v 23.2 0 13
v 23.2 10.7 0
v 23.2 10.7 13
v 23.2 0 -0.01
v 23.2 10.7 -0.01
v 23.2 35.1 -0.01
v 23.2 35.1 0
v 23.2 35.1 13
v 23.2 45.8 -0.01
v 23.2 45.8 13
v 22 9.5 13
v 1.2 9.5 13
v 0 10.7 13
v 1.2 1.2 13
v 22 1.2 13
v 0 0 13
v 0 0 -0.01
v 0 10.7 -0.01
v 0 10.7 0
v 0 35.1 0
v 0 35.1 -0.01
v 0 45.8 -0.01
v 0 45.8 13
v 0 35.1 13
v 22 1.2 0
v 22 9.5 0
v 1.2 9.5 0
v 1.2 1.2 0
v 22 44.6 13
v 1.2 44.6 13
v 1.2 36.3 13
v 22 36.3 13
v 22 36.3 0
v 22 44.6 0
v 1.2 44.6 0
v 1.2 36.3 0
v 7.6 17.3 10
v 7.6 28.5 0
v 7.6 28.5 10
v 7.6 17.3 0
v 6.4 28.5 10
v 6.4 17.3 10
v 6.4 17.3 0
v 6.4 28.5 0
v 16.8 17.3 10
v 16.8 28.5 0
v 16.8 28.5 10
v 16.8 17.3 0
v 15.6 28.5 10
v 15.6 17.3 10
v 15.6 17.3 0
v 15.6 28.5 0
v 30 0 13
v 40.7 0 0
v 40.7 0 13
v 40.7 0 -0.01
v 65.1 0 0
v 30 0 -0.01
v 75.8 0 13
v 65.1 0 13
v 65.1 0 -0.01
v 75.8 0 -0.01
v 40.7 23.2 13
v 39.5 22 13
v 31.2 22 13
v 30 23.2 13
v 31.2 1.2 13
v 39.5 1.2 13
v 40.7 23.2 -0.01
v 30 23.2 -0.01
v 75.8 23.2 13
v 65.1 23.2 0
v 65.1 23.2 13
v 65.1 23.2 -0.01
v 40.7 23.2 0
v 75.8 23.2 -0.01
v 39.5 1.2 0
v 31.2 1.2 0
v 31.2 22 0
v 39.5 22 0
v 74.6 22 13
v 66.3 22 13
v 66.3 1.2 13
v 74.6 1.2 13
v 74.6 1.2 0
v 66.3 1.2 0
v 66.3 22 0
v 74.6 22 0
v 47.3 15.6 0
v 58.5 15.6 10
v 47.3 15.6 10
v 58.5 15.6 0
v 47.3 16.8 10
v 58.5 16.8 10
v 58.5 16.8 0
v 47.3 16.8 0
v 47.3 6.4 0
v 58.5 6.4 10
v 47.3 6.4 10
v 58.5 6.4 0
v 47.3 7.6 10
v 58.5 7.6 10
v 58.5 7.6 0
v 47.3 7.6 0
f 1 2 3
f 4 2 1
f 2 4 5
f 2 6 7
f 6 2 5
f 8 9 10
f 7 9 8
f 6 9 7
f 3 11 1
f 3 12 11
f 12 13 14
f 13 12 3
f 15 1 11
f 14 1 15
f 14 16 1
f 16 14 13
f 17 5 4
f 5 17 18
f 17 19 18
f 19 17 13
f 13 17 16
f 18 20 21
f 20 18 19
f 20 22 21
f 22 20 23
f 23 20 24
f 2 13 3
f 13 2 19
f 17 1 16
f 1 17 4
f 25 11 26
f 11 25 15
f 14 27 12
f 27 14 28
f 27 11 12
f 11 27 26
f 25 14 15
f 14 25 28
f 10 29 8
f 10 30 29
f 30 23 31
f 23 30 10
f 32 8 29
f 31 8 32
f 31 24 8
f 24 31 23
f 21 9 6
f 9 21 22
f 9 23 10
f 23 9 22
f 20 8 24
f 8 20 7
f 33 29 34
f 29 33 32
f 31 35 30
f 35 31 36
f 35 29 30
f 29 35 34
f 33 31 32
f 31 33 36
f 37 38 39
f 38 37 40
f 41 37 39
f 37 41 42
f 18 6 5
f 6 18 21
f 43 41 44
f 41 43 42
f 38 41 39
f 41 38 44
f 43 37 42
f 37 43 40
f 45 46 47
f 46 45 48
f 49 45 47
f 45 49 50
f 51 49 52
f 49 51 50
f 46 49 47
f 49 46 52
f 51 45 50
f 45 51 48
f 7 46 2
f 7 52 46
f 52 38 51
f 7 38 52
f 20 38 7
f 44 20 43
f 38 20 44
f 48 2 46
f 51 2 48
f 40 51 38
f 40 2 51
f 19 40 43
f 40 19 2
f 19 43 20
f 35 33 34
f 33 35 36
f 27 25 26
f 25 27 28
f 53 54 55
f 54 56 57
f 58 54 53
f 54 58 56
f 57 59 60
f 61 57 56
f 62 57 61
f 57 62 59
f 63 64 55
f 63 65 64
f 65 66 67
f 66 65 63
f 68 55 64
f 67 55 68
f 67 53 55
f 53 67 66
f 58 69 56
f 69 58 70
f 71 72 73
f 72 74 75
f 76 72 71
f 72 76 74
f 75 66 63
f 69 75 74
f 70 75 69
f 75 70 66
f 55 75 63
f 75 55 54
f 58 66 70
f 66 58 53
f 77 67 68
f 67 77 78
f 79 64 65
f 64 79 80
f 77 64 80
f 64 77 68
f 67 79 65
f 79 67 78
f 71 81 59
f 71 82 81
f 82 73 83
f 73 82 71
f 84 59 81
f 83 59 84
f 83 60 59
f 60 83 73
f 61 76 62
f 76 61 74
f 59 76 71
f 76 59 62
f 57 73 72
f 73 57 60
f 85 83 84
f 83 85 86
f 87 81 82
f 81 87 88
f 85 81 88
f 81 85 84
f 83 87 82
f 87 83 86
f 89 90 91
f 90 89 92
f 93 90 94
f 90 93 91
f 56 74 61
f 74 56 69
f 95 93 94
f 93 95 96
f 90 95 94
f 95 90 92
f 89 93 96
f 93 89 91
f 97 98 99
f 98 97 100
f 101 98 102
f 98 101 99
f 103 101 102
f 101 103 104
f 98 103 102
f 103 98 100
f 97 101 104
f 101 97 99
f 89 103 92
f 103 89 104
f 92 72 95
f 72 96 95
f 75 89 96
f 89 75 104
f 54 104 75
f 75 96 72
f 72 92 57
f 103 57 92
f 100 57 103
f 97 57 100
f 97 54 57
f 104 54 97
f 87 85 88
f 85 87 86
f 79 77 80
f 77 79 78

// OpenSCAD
// file: ../../Elements/FrameLockingRing.scad
// Fischertechnik Box Library
// Frame for Locking Ring
// 31020

use <../Base/Constants.scad>
use <../ModelBase/Simple.scad>

width = 20;
depth = 7.5;
height = 13;

// getFrameLockingRingSpace(columns=1, rows=1)
// columns = Count of locking rings in X direction (width of ring)
// rows = Count of locking rings in Y direction (depth of ring)
// Gets the space the frame locking ring needs as width (.x and .y as a list)

function getFrameLockingRingSpace(columns=1, rows=1) = getFrameOuterVolume([width*columns, depth*rows, height]);

// FrameLockingRing(columns, rows, smallSideIsX)
// columns = Count of locking rings in X direction (width of ring)
// rows = Count of locking rings in Y direction (depth of ring)
// The walls of the frame are 13 mm high. The small side is 7.5 mm wide, the large side
// is 20 mm wide.

module FrameLockingRing(columns=1, rows=1) {
    Frame([width*columns, depth*rows, height]);
}

// Tests
color("lightgray")
    FrameLockingRing(1);
// file: ../../Elements/HolderWinchDrum.scad
// Fischertechnik Box Library
// Holder for Winch Drum
// 31016

use <../Base/Constants.scad>
use <../Base/Placement.scad>
use <../ModelBase/Simple.scad>

width = 20;
depth = 25;
height = 10;

// getWinchDrumHolderSpace()
// Gets the space the winch drum holder needs as width and depth (.x and .y as a list)

function getHolderWinchDrumSpace() = [width, depth, height];

// HolderWinchDrum()
// Two walls for holding the 31016 winch drum.

module HolderWinchDrum() {
    holderDepth = 11.2;
    holderDistance = 8;
    
    Space(getHolderWinchDrumSpace());
    
    module Holders() {
        Wall([getDividerThickness(), holderDepth, height]);
        translate([holderDistance + getDividerThickness(), 0])
            Wall([getDividerThickness(), holderDepth, height]);
    }
    
    Center(getHolderWinchDrumSpace(), [holderDistance + 2*getDividerThickness(), holderDepth]) {
        Holders();
    }
}

// Tests
color("lightgray")
HolderWinchDrum();
// file: ../../Base/Boxes.scad
// Fischertechnik Box Foundation
// Pre-designed Boxes

use <Constants.scad>

include <PlacementOptions.scad>

box190Width = 190;
box190Depth = 130;
box130Width = 130;
box130Depth = 95;
boxUsageHeight = 33.9;
boxWallThickness = 2.4;
boxBaseThickness = 1.0;

// getBoxWallThickness()
// Gets the wall thickness of a Fischertechnik Box

function getBoxWallThickness() = boxWallThickness;

// Gets the usable height of a fischertechnik box
function getBoxUsageHeight() = boxUsageHeight;

// Gets the thickness of the Fischertechnik box base.
function getBoxBaseThickness() = boxBaseThickness;

// Gets the usable inner space of a Box 190 as an x/y-list
function getBox190Space() = [
    box190Width - 2*getBoxWallThickness(), 
    box190Depth - 2*getBoxWallThickness() ];

// Imports the Fischertechnik empty box 130x190 mm and places it at position 0,0
// 190x130 are the outer sizes, the inner space is slightly smaller. Use getBox190Space() to get the inner sizes.
// This module needs the STL file "Fischertechnik Box 130x190.stl" in the library path.
// The box is positioned that the usable inner space is at the 0,0,0 position. The

module Box190() {
    translate([-getBoxWallThickness(),-getBoxWallThickness(),-getBoxBaseThickness()])
        import("Fischertechnik Box 130x190.stl", convexity=3);
}

// Gets the usable inner space of a Box 130 as an x/y-list
function getBox130Space() = [
    box130Width - 2*getBoxWallThickness(), 
    box130Depth - 2*getBoxWallThickness() ];

// Imports the Fischertechnik empty box 95x130 mm and places it at position 0,0
// 190x130 are the outer sizes, the inner space is slightly smaller. Use getBox190Space() to get the inner sizes.
// This module needs the STL file "Fischertechnik Box 95x130.stl" in the library path.
// The box is positioned that the usable inner space is at the 0,0,0 position. The

module Box130() {
    translate([-getBoxWallThickness(),-getBoxWallThickness(),-getBoxBaseThickness()])
        import("Fischertechnik Box 95x130.stl", convexity=3);
}

// Creates a web at the specified box walls
// corner 0 = LowerLeft, 1 = UpperLeft, 2 = UpperRight, 3 = LowerRight
// side 0 = LeftOfCorner, 1 = RightOfCorner
// distance = Distance in mm from the corner
// box = inner width and depth of the box (default: Box 190)
// webWidth = length of the web (default is 3 mms)
// webThickness = thickness of the web (default is 1 mm)

module BoxWeb(corner, side, distance, box=getBox190Space(), webWidth=3, webThickness=1.0) {
    sink = getBoxWallThickness()/2;

    width = (corner % 2 == 0) ? 
            (side == LeftOfCorner ? webWidth : webThickness) :
            (side == LeftOfCorner ? webThickness : webWidth);

    depth = (corner % 2 == 0) ? 
            (side == RightOfCorner ? webWidth : webThickness) :
            (side == RightOfCorner ? webThickness : webWidth);
    
    xDiff = corner == LowerLeft ? 
                (side == LeftOfCorner ? -sink : distance) :
            (corner == UpperLeft ?                
                (side == LeftOfCorner ? distance : -sink) :
            (corner == UpperRight ?
                (side == LeftOfCorner ? box.x-webWidth+sink : box.x-distance-webThickness) :
                (side == LeftOfCorner ? box.x-distance-webThickness: box.x-webWidth+sink)));

    yDiff = corner == LowerLeft ? 
                (side == RightOfCorner ? -sink : distance) :
            (corner == UpperLeft ?
                (side == RightOfCorner ? box.y-distance : box.y-webWidth+sink) :
            (corner == UpperRight ?
                (side == RightOfCorner ? box.y-webWidth+sink : box.y-distance) :
                (side == RightOfCorner ? distance : -sink)));
    
    translate([xDiff, yDiff, -getExcess()])
        cube([width, depth, boxUsageHeight + 2*getExcess()]);
}
// file: ../../Base/Rotation.scad
// Fischertechnik Box Foundation
// Geometry Helpers Rotation

include <PlacementOptions.scad>

// getRotatedSpace(space, rotation=NoRotation)
// Rotates the space dependent on the specified rotation

function getRotatedSpace(space, rotation=NoRotation) = [
    (rotation == Rotate90 || rotation == Rotate270) ? space.y : space.x,
    (rotation == Rotate90 || rotation == Rotate270) ? space.x : space.y
];

// Rotates the given space around the fixed left lower corner
// space = the space the children needs as width/depth list [width,depth]
// rotation = 0 Rotate0 degrees, 1 Rotate90 degrees, 2 Rotate180 degrees, 3 Rotate270 degrees (equivalent to -90)

module RotateFix(space, rotation=Rotate0) {
    dy = (rotation == Rotate0 || rotation == Rotate270) ? 0 :
        (rotation == Rotate90) ? space.x :
        space.y;
    dx = (rotation < Rotate180) ? 0 :
        (rotation == Rotate180) ? space.x :
        space.y;
    
    translate([dx, dy, 0])
        rotate([0, 0, rotations[rotation]])
            children();
}
// file: ../../Base/Alignment.scad
// Fischertechnik Box Foundation
// Geometry Helpers Alignment

include <PlacementOptions.scad>

// getAlignedX(elementWidth, spaceWidth, align=AlignRight, offset=0)
// Gets the aligned X offset of an element with the given
// width in the given space.
// elementWidth = The width of the element to positon
// spaceWidth = The space where the element should be aligned
// align = 0 AlignLeft, 1 AlignCenter, 2 AlignRight
// offset = an optional offset from the aligned position. When
// aligned left or centered, then positive values are in X direction.
// When aligned right then positive values are in negative X direction.

function getAlignedX(elementWidth, spaceWidth, align=AlignRight, offset=0) =
    (align == AlignLeft) ?
        offset :
        ((align == AlignCenter) ?
        (spaceWidth - elementWidth)/2 + offset :
        spaceWidth - offset - elementWidth);

// getAlignedY(elementDepth, spaceDepth, align=AlignTop, offset=0)
// Gets the aligned Y offset of an element with the given
// depth in the given space.
// elementDepth = The depth of the element to positon
// spaceDepth = The space where the element should be aligned
// align = 0 AlignBottom, 1 AlignCenter, 2 AlignTop
// offset = an optional offset from the aligned position. When
// aligned bottom or centered, then positive values are in Y direction.
// When aligned top then positive values are in negative Y direction.

function getAlignedY(elementDepth, spaceDepth, align=AlignTop, offset=0) =
    (align == AlignBottom) ?
        offset :
        ((align == AlignCenter) ?
        (spaceDepth - elementDepth)/2 + offset :
        spaceDepth - offset - elementDepth);
// file: ../../Base/Constants.scad
// Fischertechnik Box Foundation
// Constants

// Constant values necessary for multiple elements

// Base constants
dividerThickness = 1.2;
excess = 0.01;
fragments = 90;
tolerance = 0.8;

// Gets the thickness of a divider 
function getDividerThickness() = dividerThickness;

// Gets the excess that is used to merge walls into each other
function getExcess() = excess;

// Gets amount of fragments of a cylinder
function getFragments() = fragments;

// Gets the inner tolerance of a frame to each side
function getTolerance() = tolerance;


// Fischertechnik specific constants
axisDiameter = 4;
axisBottomDiameter = axisDiameter + 1;
standardEdgeDistance = 2.5;
standardWebDistance = 11.5;
standardCornerLength = 15;
tubeWallFactor = 1.6;

// Gets axis diameter
function getAxisDiameter() = axisDiameter;

// Gets axis bottom diameter for thicker part at the bottom
function getAxisBottomDiameter() = axisBottomDiameter;

// gets the standard distance to the wall of the box for dockable frames with webs
function getStandardEdgeDistance() = standardEdgeDistance;

// gets the standard distance of each web to the corner of the dockable frame
function getStandardWebDistance() = standardWebDistance;

// gets the standard length of the corner walls of a dockable frame
function getStandardCornerLength() = standardCornerLength;

// gets the wall thickness of a tube.
function getTubeWallThickness() = tubeWallFactor * getDividerThickness();
// file: ../../Base/PlacementOptions.scad
// Fischertechnik Box Foundation
// Placement Options

// Alignment
NoAlign = 0;
AlignLeft = 1;
AlignBottom = 2;
AlignCenter = 3;
AlignRight = 4;
AlignTop = 5;

// Element rotation degree steps
rotations = [0, -90, -180, -270];

// Rotation
NoRotation = 0;
Rotate0 = 0;
Rotate90 = 1;
Rotate180 = 2;
Rotate270 = 3;

// Docking (seen from above)
NoDock = -1;
DockLeft = 0;
DockTop = 1;
DockRight = 2;
DockCorner = 2;
DockBottom = 3;

// Web corners
LowerLeft = 0;
UpperLeft = 1;
UpperRight = 2;
LowerRight = 3;

// Web position relative to corner
LeftOfCorner = 0;
RightOfCorner = 1;
// file: ../../Elements/HolderWinchDrumWithLockingRings.scad
// Fischertechnik Box Library
// Complete Winch Drum with Locking Rings
// 31018 + 2 x 31020

use <../ModelBase/Simple.scad>
use <HolderWinchDrum.scad>
use <FrameLockingRing.scad>

distance = 24.4;

// getHolderWinchDrumWithLockingRingsSpace()
// Gets the space the holder winch drum with locking rings needs as width (.x and .y as a list)

function getHolderWinchDrumWithLockingRingsSpace() = [
    getFrameLockingRingSpace().x, 
    getFrameLockingRingSpace().y * 2 + distance,
    getFrameLockingRingSpace().z];

// HolderWinchDrumWithLockingRings
// Combination of a winch drum holder with two locking ring holders at both ends

module HolderWinchDrumWithLockingRings() {    
    yOffsetFrame = distance + getFrameLockingRingSpace()[1];
    
    Space(getHolderWinchDrumWithLockingRingsSpace());
    
    FrameLockingRing();
    translate([0, yOffsetFrame, 0])
        FrameLockingRing();
    
    xOffset = (getFrameLockingRingSpace()[0] - getHolderWinchDrumSpace()[0]) / 2;
    yOffset = (distance + 2 * getFrameLockingRingSpace()[1] - getHolderWinchDrumSpace()[1]) / 2;
    
    translate([xOffset, yOffset, 0])
        HolderWinchDrum();
}

// Tests
color("lightgray")
HolderWinchDrumWithLockingRings();
// file: ../../Base/Placement.scad
// Fischertechnik Box Foundation
// Geometry Helpers Placement

use <Constants.scad>
use <Alignment.scad>
use <Rotation.scad>
use <Boxes.scad>

include <PlacementOptions.scad>

// Place(x=0, y=0, elementSpace=[0,0], alignX=AlignLeft, alignY=AlignBottom, rotation=Rotate0, boxSpace=getBox190Space())
// Places the child at the specified position
// y = Y-Position. This is a relative position when an X aligment is specified.
// x = X-Position. This is a relative position when an Y aligment is specified.
// elementSpace = space of the element to be placed [x,y]
// alignX = -1=NoAlign, 0 AlignLeft, 1 AlignCenter, 3 AlignRight (elementSpace and boxSpace required!)
// alignY = -1=NoAlign, 2 AlignBottom, 1 AlignCenter, 4 AlignTop (elementSpace and boxSpace required!)
// rotation = 0 Rotate0 0 degrees, 1 Rotate90 90 degrees, 
// 2 Rotate180 180 degrees, 3 Rotate270 270 degrees (equivalent to -90)
// boxSpace = Inner space of the box where the placement occurs [x,y] - default is Box 190x130 inner space

module Place(x=0, y=0, elementSpace=[0,0], 
  alignX=AlignLeft, alignY=AlignBottom, 
  rotation=NoRotation, boxSpace=getBox190Space()) {

    module Position(x, y, space, rotation=Rotate0) {
        translate([x, y, 0])
            RotateFix(space, rotation)
                children(0);
    }

    space = getRotatedSpace(elementSpace, rotation);
    alignedX = getAlignedX(space.x, boxSpace.x, alignX, x);
    alignedY = getAlignedY(space.y, boxSpace.y, alignY, y);
    Position(alignedX, alignedY, elementSpace, rotation)
        children(0);
}

// Center(space=getBox130Space(), elementSpace=[0,0])
// space = Space where the children is centered. For cylinder use centered=true and no elementSpace.
// elementSpace = space of the element to be centered [x,y]

module Center(space=getBox190Space(), elementSpace=[0,0]) {
    translate([(space.x - elementSpace.x) / 2, (space.y - elementSpace.y) / 2])
        children(0);
}

// CenterHorizontal(width=0, y=0, offset=0, space=getBox130Space())
// space = Space where the children is centered. For cylinder use centered=true and no elementSpace.
// elementSpace = space of the element to be centered [x,y]

module CenterHorizontal(width=0, y=0, offset=0, space=getBox190Space()) {
    translate([(space.x - width) / 2 + offset, y])
        children(0);
}

// CenterVertical(depth=0, x=0, offset=0, space=getBox130Space())
// space = Space where the children is centered. For cylinder use centered=true and no elementSpace.
// elementSpace = space of the element to be centered [x,y]

module CenterVerticalal(depth=0, x=0, offset=0, space=getBox190Space()) {
    translate([x, (space.y - depth) / 2 + offset])
        children(0);
}
// main file
// Fischertechnik Box Foundation
// Elements
// Test HolderWinchDrumWithLockingRings

use <../../Base/Placement.scad>
use <../../Elements/HolderWinchDrumWithLockingRings.scad>

include <../../Base/PlacementOptions.scad>

HolderWinchDrumWithLockingRings();

Place(30, 0, elementSpace=getHolderWinchDrumWithLockingRingsSpace(), rotation=Rotate90)
    HolderWinchDrumWithLockingRings();
